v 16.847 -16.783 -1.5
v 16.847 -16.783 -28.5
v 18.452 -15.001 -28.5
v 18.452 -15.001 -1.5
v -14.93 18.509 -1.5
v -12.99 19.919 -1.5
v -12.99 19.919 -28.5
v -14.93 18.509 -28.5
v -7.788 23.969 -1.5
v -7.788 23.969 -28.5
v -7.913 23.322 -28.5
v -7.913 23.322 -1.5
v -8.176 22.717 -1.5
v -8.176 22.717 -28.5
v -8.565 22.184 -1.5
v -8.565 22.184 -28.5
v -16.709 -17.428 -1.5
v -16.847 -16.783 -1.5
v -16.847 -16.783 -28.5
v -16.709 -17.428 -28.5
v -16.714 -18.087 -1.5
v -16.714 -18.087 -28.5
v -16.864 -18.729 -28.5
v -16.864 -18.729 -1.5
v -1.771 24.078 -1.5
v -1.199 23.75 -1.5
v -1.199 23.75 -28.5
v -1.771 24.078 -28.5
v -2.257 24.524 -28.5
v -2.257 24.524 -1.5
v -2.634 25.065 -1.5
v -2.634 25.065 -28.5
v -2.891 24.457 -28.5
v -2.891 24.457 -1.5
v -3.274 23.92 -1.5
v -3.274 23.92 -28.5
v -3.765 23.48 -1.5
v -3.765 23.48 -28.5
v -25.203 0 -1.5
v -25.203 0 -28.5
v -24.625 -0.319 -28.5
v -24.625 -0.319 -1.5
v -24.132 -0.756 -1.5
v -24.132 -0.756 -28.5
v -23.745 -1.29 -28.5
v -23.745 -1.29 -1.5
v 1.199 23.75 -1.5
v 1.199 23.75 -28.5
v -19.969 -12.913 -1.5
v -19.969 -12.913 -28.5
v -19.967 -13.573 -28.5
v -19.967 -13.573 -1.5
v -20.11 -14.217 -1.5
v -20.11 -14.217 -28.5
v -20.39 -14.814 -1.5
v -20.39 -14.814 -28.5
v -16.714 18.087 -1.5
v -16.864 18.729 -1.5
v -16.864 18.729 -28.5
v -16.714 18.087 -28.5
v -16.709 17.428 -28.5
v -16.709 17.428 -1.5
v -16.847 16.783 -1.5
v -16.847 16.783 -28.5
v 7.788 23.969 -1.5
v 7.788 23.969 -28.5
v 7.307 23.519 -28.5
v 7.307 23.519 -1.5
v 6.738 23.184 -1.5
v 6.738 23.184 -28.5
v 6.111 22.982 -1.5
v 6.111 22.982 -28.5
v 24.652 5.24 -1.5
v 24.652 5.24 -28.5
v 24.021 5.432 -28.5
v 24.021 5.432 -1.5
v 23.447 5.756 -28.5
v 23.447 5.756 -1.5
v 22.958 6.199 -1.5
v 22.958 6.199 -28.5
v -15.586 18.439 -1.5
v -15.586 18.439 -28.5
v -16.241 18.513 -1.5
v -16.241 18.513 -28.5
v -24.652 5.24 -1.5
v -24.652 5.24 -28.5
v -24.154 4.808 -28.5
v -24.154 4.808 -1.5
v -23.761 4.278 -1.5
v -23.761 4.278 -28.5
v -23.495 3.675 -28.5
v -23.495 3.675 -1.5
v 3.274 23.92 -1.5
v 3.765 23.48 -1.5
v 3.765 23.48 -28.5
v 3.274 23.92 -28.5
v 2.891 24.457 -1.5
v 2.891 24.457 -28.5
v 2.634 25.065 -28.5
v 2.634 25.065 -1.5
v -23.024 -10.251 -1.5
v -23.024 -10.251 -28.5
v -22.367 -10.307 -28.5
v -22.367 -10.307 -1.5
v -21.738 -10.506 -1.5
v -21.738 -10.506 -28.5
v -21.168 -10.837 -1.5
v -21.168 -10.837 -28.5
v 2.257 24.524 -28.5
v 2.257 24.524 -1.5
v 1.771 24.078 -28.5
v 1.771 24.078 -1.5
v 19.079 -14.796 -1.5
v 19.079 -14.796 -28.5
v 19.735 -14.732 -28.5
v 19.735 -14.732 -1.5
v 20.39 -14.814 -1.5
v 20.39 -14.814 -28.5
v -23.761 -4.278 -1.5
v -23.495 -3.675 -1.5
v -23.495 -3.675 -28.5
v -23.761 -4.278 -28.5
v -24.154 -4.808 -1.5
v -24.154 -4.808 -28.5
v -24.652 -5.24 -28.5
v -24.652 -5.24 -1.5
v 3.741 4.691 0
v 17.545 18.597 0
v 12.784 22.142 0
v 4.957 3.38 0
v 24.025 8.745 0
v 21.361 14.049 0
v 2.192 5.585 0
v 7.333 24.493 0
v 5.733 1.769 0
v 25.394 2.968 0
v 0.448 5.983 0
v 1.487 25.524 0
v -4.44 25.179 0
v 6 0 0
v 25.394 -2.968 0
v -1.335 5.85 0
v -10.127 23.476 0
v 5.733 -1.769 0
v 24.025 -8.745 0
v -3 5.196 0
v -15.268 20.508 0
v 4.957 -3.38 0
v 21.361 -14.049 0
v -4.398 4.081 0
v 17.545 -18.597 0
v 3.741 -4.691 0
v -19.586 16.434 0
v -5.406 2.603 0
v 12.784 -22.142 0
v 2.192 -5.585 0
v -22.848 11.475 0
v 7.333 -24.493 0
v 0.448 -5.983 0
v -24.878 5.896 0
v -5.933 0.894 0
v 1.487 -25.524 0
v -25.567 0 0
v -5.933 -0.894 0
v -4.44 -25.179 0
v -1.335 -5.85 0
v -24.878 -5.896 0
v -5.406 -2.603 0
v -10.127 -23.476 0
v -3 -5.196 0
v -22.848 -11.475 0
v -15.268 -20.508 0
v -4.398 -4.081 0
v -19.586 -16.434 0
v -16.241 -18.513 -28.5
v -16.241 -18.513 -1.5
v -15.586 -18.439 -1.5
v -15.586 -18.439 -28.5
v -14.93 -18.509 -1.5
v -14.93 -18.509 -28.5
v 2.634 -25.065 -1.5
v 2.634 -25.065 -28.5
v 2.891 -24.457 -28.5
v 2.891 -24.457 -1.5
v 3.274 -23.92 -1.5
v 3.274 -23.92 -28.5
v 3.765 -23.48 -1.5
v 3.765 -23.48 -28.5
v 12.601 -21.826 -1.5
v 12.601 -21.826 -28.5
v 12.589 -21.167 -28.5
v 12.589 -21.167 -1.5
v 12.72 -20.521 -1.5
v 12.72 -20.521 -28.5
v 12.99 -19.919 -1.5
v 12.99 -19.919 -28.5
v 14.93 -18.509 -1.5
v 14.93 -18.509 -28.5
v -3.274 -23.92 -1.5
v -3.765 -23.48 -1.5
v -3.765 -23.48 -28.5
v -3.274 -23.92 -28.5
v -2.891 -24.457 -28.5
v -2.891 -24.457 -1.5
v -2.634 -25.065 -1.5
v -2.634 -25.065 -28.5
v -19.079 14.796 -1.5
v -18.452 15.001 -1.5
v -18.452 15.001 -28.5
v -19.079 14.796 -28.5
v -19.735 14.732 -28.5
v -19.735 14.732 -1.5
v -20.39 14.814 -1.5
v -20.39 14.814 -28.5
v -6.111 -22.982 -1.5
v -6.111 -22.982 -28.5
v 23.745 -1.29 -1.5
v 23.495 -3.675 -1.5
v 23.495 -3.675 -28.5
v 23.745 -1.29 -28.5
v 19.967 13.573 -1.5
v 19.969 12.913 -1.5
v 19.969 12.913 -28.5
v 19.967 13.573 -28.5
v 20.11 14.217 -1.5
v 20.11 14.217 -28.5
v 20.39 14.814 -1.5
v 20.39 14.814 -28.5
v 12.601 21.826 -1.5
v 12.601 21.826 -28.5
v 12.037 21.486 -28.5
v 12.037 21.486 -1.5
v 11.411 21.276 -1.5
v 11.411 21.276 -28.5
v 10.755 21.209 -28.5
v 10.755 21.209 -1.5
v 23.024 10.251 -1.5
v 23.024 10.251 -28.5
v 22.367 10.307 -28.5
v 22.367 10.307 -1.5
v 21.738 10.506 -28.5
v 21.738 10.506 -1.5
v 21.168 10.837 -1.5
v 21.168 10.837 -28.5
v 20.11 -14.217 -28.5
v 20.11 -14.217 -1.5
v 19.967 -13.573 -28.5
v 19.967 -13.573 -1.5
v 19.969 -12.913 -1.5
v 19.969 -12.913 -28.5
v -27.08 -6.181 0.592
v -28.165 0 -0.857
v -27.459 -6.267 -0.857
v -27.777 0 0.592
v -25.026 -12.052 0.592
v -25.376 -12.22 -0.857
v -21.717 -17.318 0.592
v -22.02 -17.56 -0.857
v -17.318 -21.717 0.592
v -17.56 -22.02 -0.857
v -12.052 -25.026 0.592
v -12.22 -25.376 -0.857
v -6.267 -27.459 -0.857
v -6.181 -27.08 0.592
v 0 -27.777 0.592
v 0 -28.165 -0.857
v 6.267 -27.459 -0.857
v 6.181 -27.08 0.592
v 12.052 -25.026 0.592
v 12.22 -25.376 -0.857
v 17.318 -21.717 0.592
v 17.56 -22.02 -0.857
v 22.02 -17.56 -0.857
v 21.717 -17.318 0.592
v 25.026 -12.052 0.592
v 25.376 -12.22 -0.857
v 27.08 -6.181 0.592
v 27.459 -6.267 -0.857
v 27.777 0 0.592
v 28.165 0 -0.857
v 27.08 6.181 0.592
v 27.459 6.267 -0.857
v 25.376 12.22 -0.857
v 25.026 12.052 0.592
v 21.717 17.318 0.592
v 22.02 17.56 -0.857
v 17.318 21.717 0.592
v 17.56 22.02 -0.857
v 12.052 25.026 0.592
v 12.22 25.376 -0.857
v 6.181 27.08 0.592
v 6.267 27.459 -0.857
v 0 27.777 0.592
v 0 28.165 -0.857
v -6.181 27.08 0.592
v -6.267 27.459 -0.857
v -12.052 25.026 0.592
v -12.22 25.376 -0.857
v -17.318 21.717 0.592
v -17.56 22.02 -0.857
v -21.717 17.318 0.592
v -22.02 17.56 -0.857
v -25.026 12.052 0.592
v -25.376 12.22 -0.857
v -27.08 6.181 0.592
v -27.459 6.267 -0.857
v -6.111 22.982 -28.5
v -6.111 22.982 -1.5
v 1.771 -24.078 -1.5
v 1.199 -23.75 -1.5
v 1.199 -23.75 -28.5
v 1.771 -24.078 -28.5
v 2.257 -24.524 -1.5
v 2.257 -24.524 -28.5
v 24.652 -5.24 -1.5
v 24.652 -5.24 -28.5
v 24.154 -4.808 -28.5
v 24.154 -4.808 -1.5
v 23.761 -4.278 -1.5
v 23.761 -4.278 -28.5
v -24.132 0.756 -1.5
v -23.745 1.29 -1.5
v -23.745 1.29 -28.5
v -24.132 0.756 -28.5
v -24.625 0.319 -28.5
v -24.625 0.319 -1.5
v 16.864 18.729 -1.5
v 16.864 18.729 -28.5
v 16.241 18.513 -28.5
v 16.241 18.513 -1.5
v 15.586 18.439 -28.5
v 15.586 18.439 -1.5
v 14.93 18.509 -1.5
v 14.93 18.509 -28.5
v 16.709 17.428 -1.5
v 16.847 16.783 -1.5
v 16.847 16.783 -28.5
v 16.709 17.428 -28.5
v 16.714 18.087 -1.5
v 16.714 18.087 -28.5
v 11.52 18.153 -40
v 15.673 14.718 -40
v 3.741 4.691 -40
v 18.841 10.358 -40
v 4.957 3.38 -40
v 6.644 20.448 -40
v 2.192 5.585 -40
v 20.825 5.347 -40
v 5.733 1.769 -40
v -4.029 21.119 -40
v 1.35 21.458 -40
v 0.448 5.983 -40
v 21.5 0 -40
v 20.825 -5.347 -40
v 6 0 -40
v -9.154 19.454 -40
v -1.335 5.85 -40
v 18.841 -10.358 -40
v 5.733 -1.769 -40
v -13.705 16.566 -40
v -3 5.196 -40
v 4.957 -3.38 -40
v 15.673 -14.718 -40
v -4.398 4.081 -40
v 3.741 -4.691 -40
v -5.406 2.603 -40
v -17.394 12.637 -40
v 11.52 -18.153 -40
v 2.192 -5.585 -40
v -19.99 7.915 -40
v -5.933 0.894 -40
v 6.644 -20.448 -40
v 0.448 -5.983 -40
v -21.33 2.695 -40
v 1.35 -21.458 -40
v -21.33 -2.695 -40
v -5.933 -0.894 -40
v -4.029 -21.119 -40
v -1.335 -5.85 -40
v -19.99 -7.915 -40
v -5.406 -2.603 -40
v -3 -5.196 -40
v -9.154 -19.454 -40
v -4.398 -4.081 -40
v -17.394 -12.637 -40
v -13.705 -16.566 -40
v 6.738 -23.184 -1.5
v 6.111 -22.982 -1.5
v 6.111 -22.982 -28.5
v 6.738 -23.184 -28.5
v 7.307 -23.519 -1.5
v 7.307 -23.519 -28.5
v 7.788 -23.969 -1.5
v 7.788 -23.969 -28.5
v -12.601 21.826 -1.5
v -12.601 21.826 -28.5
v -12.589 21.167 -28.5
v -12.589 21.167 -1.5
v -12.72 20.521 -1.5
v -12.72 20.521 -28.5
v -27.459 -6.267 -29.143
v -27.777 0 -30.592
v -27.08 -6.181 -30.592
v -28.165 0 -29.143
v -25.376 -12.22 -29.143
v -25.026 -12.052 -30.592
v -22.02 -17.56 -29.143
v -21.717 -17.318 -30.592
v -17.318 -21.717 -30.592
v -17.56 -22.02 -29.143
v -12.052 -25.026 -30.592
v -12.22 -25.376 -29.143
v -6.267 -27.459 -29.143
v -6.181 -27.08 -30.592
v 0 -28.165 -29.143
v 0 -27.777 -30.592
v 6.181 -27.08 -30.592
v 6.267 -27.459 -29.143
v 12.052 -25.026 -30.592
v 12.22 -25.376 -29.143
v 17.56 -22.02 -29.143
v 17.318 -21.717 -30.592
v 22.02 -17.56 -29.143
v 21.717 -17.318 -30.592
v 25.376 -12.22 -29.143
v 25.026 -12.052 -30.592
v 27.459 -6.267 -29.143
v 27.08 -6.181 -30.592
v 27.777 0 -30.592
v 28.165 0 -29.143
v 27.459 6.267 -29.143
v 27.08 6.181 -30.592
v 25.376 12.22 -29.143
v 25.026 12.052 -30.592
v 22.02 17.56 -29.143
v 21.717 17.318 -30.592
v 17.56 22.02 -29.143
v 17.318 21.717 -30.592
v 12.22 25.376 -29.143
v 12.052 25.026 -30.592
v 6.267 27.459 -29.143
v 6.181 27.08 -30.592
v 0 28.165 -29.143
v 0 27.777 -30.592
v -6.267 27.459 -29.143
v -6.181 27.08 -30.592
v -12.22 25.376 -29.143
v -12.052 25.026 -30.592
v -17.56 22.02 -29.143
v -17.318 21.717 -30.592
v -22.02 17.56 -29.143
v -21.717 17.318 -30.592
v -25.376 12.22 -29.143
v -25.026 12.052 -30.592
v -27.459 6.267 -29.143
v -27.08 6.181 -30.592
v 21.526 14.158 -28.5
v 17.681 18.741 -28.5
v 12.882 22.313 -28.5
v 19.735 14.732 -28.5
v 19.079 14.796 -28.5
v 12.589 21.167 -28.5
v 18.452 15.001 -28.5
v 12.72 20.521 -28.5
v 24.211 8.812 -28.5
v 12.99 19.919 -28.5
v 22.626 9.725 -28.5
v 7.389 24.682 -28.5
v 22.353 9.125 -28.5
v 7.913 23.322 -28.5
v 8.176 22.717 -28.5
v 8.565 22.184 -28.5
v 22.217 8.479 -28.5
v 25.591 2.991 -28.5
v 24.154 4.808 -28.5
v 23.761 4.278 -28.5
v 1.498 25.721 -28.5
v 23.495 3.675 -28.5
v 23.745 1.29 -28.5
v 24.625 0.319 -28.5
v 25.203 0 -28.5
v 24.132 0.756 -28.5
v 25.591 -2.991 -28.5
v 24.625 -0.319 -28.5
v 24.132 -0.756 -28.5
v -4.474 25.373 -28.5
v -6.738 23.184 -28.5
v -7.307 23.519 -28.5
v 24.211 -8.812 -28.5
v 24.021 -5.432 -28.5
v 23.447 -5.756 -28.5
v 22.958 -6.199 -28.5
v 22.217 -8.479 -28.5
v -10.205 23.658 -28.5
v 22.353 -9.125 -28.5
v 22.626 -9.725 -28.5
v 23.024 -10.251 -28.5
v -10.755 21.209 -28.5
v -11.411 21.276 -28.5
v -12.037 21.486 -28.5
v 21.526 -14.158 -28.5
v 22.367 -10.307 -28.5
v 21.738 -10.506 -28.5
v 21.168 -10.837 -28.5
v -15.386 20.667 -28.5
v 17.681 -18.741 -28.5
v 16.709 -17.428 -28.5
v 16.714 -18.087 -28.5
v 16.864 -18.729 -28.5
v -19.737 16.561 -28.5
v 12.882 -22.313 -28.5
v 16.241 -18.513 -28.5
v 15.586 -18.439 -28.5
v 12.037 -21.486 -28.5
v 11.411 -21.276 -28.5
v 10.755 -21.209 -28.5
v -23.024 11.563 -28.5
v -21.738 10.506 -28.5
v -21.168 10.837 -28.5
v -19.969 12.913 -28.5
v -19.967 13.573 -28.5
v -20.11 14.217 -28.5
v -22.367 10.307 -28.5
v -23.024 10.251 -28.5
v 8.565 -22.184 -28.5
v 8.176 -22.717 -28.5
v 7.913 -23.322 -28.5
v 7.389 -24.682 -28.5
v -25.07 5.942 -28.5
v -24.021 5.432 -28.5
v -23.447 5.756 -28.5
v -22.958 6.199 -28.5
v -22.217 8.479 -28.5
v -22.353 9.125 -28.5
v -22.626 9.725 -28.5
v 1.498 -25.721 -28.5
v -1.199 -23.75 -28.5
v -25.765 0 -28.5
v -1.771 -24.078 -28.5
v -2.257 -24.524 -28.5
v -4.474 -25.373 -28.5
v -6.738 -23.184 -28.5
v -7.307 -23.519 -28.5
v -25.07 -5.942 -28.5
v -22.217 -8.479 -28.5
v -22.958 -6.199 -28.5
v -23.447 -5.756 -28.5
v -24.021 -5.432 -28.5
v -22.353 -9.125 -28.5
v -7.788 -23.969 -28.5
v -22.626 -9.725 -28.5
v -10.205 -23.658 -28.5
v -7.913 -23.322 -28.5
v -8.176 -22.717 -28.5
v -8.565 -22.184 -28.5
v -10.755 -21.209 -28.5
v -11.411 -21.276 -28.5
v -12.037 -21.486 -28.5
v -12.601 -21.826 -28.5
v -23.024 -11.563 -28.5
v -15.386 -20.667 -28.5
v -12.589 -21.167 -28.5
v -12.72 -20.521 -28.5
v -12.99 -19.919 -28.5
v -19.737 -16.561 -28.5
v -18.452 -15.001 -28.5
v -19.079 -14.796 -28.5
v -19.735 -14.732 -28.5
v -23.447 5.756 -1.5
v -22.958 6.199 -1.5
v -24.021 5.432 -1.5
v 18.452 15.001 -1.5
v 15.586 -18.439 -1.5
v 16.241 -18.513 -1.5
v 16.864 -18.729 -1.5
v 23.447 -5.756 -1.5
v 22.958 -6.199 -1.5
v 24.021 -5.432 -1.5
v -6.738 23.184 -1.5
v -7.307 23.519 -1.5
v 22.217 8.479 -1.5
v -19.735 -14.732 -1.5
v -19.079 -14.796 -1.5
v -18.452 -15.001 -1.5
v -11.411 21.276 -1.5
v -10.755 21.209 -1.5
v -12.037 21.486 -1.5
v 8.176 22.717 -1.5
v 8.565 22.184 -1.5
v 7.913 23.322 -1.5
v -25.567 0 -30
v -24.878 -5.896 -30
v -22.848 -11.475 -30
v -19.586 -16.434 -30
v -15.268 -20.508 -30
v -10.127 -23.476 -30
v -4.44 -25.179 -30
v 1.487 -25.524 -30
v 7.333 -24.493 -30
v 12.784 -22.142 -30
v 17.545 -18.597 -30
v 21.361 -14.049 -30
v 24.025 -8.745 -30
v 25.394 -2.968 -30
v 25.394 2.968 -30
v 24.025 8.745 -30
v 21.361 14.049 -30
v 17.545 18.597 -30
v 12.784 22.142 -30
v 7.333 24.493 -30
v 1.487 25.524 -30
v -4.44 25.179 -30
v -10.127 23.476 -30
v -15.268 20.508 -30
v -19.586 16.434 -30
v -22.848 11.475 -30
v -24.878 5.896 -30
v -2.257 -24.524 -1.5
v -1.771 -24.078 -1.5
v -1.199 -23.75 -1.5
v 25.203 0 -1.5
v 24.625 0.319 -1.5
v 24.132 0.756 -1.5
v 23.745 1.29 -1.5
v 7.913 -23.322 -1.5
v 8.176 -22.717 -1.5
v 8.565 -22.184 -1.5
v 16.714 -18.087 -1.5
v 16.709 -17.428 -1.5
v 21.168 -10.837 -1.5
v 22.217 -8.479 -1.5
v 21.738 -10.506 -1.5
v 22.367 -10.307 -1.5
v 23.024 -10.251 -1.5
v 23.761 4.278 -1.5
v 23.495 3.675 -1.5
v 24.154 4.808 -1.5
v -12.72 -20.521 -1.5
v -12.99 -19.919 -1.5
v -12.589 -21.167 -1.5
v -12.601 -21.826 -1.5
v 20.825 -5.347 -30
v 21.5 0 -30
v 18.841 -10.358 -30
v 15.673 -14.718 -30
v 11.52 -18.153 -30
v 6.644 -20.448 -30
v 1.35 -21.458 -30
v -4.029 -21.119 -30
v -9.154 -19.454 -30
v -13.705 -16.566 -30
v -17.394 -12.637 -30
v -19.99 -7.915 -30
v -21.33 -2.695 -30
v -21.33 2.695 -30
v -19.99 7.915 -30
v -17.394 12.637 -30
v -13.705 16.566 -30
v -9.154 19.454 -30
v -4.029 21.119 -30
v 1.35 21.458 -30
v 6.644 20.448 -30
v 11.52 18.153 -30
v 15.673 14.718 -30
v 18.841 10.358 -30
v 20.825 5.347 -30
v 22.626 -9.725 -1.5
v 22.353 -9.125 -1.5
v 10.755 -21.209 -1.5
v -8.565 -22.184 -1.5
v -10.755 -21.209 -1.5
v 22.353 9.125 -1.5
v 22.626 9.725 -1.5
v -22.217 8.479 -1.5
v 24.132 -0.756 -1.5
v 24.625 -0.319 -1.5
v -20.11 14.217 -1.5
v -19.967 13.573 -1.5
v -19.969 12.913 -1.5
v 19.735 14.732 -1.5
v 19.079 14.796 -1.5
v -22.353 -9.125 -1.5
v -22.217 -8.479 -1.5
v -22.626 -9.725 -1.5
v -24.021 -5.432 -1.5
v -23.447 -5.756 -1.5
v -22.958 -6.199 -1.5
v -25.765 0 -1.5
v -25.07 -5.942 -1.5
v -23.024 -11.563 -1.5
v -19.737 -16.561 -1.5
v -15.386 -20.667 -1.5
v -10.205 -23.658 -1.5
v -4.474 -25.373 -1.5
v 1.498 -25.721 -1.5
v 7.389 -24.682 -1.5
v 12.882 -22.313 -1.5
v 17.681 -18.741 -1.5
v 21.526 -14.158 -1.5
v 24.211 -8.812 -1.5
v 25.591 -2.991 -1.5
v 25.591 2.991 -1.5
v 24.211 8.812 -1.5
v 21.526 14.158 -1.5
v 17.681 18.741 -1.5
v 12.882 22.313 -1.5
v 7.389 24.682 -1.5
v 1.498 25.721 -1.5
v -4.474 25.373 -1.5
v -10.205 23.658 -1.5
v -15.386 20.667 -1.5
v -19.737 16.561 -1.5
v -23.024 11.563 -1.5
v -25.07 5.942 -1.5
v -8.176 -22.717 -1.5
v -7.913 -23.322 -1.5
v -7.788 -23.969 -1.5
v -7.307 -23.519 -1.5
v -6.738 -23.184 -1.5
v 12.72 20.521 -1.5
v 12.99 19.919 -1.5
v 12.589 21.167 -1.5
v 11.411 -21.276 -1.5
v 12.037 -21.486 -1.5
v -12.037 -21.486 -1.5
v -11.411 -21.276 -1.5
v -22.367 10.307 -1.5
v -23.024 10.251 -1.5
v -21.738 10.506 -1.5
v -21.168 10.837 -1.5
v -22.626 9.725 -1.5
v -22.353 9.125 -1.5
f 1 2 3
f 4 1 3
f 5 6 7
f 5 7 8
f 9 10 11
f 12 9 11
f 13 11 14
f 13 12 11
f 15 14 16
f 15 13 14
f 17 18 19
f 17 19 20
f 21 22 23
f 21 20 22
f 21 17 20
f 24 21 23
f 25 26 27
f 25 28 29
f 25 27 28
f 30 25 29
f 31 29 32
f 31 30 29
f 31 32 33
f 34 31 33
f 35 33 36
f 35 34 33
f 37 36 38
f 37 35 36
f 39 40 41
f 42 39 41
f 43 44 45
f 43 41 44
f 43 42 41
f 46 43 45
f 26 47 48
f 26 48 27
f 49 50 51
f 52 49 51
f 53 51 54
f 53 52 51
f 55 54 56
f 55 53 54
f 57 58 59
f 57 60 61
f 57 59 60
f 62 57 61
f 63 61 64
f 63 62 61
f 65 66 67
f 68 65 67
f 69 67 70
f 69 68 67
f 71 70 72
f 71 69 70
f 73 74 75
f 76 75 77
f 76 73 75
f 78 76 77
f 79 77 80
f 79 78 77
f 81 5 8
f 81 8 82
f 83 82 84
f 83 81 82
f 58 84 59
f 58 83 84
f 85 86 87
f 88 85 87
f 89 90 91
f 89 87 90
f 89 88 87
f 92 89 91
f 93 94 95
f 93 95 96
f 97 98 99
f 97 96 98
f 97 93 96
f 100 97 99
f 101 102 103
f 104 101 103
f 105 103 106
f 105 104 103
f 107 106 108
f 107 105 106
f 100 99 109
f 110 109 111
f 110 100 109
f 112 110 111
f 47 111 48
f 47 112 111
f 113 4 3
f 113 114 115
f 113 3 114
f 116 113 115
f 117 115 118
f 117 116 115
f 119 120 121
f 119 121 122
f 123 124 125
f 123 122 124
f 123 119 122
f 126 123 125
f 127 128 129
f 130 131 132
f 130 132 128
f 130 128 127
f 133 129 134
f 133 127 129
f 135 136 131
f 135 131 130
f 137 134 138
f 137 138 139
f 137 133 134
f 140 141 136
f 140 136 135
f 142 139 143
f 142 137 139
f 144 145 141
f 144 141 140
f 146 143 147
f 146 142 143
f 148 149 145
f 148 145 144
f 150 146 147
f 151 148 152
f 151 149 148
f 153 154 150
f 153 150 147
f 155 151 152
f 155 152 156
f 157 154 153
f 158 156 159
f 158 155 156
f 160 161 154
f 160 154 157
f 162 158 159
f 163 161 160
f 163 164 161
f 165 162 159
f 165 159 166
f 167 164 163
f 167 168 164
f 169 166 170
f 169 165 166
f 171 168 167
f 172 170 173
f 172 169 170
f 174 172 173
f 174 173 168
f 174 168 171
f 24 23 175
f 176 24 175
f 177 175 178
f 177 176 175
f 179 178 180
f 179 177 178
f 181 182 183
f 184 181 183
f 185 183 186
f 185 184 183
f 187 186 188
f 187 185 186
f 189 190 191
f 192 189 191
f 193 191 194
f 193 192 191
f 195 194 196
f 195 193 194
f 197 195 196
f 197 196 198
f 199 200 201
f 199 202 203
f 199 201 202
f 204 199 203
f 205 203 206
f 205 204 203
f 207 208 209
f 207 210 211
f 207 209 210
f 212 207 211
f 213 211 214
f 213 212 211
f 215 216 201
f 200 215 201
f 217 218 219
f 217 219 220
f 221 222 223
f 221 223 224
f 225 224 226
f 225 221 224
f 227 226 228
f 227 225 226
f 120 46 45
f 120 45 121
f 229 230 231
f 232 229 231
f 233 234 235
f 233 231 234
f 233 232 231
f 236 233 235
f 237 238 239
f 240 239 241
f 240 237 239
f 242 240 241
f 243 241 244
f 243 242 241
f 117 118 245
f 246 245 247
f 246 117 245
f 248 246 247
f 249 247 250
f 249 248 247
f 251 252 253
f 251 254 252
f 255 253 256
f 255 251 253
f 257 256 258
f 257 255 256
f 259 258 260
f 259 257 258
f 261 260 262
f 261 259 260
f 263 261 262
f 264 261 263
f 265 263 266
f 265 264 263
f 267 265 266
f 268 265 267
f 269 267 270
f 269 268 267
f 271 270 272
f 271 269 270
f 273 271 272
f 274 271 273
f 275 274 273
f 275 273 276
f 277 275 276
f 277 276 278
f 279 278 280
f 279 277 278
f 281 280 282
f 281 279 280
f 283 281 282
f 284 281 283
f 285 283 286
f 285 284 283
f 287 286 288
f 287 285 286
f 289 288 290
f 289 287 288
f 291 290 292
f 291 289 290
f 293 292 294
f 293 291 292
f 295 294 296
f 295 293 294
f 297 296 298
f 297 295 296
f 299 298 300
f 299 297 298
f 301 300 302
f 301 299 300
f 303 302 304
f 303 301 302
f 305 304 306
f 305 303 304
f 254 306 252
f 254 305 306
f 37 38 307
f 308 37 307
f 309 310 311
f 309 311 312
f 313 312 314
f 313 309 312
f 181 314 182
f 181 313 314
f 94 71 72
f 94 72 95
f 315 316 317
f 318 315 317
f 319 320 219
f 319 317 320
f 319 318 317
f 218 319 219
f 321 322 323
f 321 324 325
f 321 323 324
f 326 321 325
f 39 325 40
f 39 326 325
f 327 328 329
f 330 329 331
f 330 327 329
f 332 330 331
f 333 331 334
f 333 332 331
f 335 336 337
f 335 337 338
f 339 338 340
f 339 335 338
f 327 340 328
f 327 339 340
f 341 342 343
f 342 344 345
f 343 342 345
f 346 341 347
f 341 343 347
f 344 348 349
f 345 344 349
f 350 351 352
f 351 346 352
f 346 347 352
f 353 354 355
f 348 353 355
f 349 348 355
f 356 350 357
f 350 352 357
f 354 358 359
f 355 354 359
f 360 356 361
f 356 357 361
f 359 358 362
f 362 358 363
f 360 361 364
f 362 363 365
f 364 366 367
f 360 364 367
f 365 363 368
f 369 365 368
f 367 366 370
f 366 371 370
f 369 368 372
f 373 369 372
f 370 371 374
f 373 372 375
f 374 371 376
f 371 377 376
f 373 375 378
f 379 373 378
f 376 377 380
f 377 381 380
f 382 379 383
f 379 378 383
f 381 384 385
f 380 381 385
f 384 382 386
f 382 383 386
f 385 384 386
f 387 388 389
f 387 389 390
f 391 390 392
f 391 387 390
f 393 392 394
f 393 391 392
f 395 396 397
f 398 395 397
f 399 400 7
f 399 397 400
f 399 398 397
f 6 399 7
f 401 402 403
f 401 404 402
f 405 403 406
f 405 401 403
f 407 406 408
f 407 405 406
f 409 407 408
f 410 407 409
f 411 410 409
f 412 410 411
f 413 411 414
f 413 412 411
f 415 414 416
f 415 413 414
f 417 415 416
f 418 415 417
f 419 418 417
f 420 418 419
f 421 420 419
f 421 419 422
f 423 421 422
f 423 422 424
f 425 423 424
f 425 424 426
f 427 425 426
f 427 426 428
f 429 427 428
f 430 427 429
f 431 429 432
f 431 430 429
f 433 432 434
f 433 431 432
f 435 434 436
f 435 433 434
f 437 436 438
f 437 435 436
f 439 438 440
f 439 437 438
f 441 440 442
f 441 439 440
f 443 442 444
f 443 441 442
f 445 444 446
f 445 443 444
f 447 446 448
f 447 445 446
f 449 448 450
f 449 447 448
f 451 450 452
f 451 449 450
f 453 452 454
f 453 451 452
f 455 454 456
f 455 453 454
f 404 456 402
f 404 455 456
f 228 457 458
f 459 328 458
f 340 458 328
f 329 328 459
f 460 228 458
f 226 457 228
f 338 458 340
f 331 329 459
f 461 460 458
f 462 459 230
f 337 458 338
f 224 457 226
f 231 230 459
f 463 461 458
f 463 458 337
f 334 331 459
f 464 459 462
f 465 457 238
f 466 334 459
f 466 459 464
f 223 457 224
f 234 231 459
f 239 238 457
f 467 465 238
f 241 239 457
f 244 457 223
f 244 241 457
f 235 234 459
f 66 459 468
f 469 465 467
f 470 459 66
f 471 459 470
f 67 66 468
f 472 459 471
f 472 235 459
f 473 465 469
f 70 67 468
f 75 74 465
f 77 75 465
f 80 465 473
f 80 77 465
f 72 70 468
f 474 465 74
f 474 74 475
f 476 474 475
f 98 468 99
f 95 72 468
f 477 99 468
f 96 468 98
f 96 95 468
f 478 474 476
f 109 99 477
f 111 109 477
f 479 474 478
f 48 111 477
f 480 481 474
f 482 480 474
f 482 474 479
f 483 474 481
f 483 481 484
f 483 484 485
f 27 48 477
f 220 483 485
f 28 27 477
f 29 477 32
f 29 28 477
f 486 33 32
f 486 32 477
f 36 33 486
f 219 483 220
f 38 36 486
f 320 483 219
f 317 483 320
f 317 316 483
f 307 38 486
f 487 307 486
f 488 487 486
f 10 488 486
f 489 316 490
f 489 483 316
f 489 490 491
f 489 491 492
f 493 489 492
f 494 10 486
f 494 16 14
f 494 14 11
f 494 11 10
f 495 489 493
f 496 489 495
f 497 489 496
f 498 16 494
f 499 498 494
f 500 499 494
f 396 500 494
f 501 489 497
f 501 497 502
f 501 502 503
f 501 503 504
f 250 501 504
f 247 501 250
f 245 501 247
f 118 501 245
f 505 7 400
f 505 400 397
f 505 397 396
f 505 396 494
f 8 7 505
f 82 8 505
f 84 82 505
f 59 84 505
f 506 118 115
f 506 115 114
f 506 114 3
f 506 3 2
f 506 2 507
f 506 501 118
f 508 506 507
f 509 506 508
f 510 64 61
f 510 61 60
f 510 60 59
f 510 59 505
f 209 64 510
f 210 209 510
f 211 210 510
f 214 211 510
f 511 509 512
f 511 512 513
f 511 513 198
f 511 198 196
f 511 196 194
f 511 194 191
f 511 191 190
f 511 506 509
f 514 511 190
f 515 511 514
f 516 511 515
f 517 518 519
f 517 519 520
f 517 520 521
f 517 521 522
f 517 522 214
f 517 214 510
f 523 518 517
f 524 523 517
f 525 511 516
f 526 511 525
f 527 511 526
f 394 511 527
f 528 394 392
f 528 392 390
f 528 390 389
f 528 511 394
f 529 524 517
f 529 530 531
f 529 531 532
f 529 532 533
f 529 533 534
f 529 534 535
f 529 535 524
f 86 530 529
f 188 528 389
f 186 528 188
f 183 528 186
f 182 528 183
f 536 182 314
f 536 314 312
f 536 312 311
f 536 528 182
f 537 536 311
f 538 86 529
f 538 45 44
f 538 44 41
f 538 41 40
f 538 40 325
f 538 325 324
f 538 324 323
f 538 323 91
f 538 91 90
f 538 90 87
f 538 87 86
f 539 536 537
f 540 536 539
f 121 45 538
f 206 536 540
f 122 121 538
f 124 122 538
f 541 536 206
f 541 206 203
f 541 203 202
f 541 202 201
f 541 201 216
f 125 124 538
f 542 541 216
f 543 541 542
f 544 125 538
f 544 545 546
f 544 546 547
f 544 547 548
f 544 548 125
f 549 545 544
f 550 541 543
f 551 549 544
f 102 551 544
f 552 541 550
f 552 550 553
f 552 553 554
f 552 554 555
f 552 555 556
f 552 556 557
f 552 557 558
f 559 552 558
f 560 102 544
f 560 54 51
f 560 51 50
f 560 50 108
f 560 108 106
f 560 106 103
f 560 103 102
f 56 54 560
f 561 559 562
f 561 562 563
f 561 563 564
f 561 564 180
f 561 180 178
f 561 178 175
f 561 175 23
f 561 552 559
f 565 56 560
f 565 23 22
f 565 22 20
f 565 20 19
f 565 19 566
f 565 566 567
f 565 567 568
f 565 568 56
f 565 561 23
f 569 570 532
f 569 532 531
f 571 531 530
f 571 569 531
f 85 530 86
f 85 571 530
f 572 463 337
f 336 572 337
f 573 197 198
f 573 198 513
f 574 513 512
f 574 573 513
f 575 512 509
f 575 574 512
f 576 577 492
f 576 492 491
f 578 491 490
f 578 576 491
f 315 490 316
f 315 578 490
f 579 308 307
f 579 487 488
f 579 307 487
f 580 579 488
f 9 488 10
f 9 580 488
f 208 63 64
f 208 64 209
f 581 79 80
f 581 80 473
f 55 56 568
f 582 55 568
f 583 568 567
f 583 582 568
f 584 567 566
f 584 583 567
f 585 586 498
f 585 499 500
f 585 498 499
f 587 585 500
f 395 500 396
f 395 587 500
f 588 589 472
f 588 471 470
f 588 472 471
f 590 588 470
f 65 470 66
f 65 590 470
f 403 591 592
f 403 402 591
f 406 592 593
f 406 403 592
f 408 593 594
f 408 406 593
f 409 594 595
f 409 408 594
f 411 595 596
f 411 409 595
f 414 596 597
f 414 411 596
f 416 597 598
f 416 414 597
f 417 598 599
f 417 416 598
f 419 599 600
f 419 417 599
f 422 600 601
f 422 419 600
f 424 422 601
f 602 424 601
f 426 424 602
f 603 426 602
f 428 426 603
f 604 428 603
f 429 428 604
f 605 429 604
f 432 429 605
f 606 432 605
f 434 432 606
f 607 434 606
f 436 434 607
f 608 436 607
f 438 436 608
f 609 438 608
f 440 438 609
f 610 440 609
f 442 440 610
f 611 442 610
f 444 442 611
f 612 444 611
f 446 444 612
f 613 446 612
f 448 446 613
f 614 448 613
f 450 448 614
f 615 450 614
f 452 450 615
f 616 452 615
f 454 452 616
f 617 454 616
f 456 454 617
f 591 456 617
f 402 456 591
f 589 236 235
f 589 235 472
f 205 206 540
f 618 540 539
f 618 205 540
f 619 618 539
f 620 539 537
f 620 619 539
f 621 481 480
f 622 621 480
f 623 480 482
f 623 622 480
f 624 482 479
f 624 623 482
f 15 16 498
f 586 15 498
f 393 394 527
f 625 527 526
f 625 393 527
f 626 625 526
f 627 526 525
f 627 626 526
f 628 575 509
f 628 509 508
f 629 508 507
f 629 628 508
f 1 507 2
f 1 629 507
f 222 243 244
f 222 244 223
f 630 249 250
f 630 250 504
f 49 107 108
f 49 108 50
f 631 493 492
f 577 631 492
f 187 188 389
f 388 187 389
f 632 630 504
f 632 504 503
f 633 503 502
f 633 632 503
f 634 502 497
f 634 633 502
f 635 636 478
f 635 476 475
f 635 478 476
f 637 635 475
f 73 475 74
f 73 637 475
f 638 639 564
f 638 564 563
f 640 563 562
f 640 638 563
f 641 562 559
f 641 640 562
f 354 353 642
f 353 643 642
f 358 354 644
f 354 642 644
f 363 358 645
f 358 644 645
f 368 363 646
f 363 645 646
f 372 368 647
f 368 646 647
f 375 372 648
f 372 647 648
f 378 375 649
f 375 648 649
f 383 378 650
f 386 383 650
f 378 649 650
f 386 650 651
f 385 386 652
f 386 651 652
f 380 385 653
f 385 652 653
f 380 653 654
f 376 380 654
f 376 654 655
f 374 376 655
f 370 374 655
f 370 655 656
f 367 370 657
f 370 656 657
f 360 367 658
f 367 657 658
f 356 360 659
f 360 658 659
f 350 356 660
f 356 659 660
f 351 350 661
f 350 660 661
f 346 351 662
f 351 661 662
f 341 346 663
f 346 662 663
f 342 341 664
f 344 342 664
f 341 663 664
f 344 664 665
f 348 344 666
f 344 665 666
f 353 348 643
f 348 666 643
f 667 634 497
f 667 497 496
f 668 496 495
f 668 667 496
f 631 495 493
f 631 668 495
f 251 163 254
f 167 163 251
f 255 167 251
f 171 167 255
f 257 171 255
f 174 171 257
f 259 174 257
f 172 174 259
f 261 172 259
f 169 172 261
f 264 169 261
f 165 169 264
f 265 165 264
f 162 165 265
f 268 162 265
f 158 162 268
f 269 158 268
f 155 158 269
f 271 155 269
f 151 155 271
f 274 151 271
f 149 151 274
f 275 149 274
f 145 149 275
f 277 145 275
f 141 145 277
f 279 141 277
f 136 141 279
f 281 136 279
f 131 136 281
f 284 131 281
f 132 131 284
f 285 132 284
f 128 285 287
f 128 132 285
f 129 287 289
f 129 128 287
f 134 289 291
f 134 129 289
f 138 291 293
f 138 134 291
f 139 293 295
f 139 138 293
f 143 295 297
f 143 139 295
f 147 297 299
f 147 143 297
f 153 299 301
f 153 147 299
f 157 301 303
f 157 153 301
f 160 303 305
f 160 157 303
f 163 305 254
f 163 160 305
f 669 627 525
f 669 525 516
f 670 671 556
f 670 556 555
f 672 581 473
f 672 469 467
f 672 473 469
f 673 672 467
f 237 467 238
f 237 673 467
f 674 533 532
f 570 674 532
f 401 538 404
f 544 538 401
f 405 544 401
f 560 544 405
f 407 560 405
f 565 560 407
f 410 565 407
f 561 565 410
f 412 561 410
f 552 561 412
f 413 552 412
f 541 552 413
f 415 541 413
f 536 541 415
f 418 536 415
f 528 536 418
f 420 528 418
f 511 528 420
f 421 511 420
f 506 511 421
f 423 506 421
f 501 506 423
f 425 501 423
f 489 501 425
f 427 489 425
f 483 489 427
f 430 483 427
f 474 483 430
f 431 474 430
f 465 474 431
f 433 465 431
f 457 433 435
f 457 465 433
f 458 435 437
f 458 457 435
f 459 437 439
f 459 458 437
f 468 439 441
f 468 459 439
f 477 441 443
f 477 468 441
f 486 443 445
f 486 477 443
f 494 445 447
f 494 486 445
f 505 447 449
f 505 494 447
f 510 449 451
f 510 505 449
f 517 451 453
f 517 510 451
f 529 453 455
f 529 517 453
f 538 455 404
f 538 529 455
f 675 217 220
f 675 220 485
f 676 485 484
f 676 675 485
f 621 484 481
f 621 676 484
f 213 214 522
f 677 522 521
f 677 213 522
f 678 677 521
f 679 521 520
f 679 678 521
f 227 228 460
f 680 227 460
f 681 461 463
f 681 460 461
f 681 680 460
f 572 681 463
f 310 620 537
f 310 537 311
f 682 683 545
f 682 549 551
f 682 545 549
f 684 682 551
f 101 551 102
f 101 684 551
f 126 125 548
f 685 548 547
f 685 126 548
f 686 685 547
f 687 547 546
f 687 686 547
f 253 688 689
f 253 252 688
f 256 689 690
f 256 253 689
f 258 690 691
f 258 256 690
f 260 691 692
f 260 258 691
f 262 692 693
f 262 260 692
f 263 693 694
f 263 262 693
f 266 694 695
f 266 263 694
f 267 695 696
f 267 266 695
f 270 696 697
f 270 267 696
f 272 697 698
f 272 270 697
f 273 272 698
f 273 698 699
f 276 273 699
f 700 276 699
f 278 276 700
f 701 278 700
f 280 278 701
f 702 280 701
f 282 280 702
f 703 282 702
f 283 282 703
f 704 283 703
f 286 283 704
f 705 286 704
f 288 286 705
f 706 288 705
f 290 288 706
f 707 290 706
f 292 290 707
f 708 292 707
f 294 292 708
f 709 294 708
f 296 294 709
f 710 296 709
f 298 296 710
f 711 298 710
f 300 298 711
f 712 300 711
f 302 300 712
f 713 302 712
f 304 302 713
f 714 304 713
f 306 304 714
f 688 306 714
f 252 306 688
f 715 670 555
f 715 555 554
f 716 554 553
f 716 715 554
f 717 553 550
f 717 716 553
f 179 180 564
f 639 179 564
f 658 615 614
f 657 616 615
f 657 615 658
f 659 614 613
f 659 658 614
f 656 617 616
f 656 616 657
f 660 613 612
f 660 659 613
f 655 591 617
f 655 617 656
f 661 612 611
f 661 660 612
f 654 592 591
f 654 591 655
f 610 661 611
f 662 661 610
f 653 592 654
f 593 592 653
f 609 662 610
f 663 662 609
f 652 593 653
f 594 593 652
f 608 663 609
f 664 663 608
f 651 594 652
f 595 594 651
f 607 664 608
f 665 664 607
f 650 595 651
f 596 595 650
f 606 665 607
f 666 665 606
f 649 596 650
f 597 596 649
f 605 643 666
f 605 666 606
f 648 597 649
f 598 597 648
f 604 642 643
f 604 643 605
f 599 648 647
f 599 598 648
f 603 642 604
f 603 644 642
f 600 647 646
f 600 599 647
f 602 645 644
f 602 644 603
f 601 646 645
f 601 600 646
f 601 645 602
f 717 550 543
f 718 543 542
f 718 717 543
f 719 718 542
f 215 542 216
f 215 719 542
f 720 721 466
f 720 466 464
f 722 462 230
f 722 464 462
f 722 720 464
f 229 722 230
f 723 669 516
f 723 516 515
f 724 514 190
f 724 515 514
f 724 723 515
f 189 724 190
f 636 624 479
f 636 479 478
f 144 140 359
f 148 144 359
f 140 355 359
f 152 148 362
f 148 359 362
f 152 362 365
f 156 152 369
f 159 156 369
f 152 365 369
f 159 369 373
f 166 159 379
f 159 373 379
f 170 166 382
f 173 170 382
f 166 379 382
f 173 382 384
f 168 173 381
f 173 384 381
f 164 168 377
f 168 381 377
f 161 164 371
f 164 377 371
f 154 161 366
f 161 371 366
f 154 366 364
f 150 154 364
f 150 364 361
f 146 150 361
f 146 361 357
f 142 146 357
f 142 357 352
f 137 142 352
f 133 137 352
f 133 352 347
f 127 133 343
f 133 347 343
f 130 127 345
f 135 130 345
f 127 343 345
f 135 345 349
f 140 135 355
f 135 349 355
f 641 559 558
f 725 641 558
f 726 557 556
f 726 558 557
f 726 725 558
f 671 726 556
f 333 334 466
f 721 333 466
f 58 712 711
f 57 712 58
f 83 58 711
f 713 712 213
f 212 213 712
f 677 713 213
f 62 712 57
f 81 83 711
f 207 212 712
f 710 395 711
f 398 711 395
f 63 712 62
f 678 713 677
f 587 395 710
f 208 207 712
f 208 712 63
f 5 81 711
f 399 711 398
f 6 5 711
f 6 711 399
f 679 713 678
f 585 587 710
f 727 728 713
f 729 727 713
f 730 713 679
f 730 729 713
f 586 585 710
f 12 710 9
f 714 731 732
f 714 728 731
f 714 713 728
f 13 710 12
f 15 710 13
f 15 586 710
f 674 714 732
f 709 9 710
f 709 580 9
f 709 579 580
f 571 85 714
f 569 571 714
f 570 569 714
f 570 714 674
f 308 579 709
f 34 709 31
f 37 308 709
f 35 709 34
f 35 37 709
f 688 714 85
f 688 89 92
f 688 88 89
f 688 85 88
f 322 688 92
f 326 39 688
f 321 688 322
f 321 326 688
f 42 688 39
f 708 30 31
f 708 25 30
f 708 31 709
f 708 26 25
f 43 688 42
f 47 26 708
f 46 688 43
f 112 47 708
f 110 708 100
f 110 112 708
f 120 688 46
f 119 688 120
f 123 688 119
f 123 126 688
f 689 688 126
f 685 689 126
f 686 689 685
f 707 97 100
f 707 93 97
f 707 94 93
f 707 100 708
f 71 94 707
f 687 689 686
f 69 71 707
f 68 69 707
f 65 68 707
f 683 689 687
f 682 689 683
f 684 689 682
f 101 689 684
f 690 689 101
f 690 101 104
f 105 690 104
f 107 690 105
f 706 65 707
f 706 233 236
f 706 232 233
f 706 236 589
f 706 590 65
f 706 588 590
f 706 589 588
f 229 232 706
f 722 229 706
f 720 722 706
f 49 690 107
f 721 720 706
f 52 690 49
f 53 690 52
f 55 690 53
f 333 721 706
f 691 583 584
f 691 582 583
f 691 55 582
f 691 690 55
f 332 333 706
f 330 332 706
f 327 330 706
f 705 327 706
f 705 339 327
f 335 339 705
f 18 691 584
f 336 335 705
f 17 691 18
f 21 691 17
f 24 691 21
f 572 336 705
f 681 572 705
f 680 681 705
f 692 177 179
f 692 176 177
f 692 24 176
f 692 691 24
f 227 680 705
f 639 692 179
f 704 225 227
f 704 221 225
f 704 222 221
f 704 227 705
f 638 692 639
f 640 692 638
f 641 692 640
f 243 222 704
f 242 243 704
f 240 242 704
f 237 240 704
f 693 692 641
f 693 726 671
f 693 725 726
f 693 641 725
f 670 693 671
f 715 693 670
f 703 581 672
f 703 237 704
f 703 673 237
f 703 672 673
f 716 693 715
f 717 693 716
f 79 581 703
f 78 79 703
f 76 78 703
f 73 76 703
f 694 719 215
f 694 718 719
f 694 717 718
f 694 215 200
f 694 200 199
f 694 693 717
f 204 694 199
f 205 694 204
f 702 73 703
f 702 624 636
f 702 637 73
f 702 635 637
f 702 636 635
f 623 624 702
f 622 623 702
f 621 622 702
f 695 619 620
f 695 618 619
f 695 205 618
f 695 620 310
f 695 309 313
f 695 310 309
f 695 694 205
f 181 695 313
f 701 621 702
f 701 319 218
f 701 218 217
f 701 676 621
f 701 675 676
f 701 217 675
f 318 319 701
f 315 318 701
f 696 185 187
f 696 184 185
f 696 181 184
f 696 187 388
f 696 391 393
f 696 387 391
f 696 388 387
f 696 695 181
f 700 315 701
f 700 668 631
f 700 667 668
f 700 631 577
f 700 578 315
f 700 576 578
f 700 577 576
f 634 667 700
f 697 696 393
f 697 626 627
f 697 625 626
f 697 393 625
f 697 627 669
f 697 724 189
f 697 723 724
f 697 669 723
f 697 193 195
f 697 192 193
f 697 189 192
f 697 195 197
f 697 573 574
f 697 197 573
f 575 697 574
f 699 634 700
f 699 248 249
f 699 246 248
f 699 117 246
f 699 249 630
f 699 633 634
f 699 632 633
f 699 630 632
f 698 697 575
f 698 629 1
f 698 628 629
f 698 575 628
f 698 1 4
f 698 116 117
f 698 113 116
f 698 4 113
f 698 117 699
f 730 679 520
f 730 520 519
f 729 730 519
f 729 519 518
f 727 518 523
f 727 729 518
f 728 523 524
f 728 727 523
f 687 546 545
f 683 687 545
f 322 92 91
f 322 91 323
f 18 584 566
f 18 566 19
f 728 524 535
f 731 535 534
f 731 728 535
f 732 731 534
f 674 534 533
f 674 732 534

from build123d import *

# Parameters (mm, degrees)
CUT_EXTRUDE1_DEPTH = 35
CIRPATTERN1_COUNT  = 30
SKETCH4_W          = 1.5
SKETCH4_H          = 1.584495562


with BuildPart() as part:
    # Sketch1 → Revolve1 (revolve)
    with BuildSketch(Plane(origin=(0, 0, 0), x_dir=(0, 0, -1), z_dir=(1, 0, 0)), mode=Mode.PRIVATE) as revolve1_sk:
        Polygon((0, 6), (40, 6), (40, 21.5), (30, 21.5), (30, 27.25), (0, 27.25), align=None)
    revolve(revolve1_sk.sketch.rotate(Axis((0, 0, 0), (0, 0, -1)), 90), axis=Axis((0, 0, 0), (0, 0, -1)))

    # Sketch2 → Cut-Extrude1 (cut)
    with BuildSketch(Plane.XY):
        with BuildLine():
            Line((3.75, 26.5), (3.674234614, 26.5))
            ThreePointArc((3.674234614, 26.5), (3.199892965, 26.330947502), (2.939387691, 25.9))
            ThreePointArc((2.939387691, 25.9), (2.331759211, 24.612435701), (1.198957881, 23.75))
            Line((1.198957881, 23.75), (-1.198957881, 23.75))
            ThreePointArc((-1.198957881, 23.75), (-2.331759211, 24.612435701), (-2.939387691, 25.9))
            ThreePointArc((-2.939387691, 25.9), (-3.199892965, 26.330947502), (-3.674234614, 26.5))
            Line((-3.674234614, 26.5), (-3.75, 26.5))
            Line((-3.75, 26.5), (-3.75, 28.5))
            Line((-3.75, 28.5), (3.75, 28.5))
            Line((3.75, 28.5), (3.75, 26.5))
        make_face()
    cut_extrude1 = extrude(amount=-CUT_EXTRUDE1_DEPTH, mode=Mode.SUBTRACT)

    # CirPattern1: Cut-Extrude1 ×30 about axis
    cirpattern1_axis = Axis((0, 0, 0), (0, 0, 1))
    for i in range(1, CIRPATTERN1_COUNT):
        add(cut_extrude1.rotate(cirpattern1_axis, i * 360 / CIRPATTERN1_COUNT), mode=Mode.SUBTRACT)

    # Sketch4 → Revolve3 (revolve)
    with BuildSketch(Plane(origin=(0, 0, 0), x_dir=(0, 0, -1), z_dir=(1, 0, 0)), mode=Mode.PRIVATE) as revolve3_sk:
        Polygon((28.5, 25.76477844), (28.5, 25.06477844), (30, 25.06477844), (30, 25.567299693), (29.948888739, 25.376549872), align=None)
        Polygon((30, 25.76477844), (28.5, 25.76477844), (29.948888739, 25.376549872), (30, 25.567299693), align=None)
        Polygon((29.143078062, 28.16477844), (28.5, 25.76477844), (30, 25.76477844), (30, 25.567299693), (30.591966801, 27.776549872), align=None)
        with Locations((29.25, 24.272530659)):
            Rectangle(SKETCH4_W, SKETCH4_H)
        Polygon((0, 25.567299693), (0, 25.76477844), (1.5, 25.76477844), (0.856921938, 28.16477844), (-0.591966801, 27.776549872), align=None)
        Polygon((1.5, 25.06477844), (1.5, 25.76477844), (0.051111261, 25.376549872), (0, 25.567299693), (0, 25.06477844), align=None)
        Polygon((1.5, 25.76477844), (0, 25.76477844), (0, 25.567299693), (0.051111261, 25.376549872), align=None)
        with Locations((0.75, 24.272530659)):
            Rectangle(SKETCH4_W, SKETCH4_H)
    revolve(revolve3_sk.sketch.rotate(Axis((0, 0, 0), (0, 0, 1)), 90), axis=Axis((0, 0, 0), (0, 0, 1)))


solid = part.part
